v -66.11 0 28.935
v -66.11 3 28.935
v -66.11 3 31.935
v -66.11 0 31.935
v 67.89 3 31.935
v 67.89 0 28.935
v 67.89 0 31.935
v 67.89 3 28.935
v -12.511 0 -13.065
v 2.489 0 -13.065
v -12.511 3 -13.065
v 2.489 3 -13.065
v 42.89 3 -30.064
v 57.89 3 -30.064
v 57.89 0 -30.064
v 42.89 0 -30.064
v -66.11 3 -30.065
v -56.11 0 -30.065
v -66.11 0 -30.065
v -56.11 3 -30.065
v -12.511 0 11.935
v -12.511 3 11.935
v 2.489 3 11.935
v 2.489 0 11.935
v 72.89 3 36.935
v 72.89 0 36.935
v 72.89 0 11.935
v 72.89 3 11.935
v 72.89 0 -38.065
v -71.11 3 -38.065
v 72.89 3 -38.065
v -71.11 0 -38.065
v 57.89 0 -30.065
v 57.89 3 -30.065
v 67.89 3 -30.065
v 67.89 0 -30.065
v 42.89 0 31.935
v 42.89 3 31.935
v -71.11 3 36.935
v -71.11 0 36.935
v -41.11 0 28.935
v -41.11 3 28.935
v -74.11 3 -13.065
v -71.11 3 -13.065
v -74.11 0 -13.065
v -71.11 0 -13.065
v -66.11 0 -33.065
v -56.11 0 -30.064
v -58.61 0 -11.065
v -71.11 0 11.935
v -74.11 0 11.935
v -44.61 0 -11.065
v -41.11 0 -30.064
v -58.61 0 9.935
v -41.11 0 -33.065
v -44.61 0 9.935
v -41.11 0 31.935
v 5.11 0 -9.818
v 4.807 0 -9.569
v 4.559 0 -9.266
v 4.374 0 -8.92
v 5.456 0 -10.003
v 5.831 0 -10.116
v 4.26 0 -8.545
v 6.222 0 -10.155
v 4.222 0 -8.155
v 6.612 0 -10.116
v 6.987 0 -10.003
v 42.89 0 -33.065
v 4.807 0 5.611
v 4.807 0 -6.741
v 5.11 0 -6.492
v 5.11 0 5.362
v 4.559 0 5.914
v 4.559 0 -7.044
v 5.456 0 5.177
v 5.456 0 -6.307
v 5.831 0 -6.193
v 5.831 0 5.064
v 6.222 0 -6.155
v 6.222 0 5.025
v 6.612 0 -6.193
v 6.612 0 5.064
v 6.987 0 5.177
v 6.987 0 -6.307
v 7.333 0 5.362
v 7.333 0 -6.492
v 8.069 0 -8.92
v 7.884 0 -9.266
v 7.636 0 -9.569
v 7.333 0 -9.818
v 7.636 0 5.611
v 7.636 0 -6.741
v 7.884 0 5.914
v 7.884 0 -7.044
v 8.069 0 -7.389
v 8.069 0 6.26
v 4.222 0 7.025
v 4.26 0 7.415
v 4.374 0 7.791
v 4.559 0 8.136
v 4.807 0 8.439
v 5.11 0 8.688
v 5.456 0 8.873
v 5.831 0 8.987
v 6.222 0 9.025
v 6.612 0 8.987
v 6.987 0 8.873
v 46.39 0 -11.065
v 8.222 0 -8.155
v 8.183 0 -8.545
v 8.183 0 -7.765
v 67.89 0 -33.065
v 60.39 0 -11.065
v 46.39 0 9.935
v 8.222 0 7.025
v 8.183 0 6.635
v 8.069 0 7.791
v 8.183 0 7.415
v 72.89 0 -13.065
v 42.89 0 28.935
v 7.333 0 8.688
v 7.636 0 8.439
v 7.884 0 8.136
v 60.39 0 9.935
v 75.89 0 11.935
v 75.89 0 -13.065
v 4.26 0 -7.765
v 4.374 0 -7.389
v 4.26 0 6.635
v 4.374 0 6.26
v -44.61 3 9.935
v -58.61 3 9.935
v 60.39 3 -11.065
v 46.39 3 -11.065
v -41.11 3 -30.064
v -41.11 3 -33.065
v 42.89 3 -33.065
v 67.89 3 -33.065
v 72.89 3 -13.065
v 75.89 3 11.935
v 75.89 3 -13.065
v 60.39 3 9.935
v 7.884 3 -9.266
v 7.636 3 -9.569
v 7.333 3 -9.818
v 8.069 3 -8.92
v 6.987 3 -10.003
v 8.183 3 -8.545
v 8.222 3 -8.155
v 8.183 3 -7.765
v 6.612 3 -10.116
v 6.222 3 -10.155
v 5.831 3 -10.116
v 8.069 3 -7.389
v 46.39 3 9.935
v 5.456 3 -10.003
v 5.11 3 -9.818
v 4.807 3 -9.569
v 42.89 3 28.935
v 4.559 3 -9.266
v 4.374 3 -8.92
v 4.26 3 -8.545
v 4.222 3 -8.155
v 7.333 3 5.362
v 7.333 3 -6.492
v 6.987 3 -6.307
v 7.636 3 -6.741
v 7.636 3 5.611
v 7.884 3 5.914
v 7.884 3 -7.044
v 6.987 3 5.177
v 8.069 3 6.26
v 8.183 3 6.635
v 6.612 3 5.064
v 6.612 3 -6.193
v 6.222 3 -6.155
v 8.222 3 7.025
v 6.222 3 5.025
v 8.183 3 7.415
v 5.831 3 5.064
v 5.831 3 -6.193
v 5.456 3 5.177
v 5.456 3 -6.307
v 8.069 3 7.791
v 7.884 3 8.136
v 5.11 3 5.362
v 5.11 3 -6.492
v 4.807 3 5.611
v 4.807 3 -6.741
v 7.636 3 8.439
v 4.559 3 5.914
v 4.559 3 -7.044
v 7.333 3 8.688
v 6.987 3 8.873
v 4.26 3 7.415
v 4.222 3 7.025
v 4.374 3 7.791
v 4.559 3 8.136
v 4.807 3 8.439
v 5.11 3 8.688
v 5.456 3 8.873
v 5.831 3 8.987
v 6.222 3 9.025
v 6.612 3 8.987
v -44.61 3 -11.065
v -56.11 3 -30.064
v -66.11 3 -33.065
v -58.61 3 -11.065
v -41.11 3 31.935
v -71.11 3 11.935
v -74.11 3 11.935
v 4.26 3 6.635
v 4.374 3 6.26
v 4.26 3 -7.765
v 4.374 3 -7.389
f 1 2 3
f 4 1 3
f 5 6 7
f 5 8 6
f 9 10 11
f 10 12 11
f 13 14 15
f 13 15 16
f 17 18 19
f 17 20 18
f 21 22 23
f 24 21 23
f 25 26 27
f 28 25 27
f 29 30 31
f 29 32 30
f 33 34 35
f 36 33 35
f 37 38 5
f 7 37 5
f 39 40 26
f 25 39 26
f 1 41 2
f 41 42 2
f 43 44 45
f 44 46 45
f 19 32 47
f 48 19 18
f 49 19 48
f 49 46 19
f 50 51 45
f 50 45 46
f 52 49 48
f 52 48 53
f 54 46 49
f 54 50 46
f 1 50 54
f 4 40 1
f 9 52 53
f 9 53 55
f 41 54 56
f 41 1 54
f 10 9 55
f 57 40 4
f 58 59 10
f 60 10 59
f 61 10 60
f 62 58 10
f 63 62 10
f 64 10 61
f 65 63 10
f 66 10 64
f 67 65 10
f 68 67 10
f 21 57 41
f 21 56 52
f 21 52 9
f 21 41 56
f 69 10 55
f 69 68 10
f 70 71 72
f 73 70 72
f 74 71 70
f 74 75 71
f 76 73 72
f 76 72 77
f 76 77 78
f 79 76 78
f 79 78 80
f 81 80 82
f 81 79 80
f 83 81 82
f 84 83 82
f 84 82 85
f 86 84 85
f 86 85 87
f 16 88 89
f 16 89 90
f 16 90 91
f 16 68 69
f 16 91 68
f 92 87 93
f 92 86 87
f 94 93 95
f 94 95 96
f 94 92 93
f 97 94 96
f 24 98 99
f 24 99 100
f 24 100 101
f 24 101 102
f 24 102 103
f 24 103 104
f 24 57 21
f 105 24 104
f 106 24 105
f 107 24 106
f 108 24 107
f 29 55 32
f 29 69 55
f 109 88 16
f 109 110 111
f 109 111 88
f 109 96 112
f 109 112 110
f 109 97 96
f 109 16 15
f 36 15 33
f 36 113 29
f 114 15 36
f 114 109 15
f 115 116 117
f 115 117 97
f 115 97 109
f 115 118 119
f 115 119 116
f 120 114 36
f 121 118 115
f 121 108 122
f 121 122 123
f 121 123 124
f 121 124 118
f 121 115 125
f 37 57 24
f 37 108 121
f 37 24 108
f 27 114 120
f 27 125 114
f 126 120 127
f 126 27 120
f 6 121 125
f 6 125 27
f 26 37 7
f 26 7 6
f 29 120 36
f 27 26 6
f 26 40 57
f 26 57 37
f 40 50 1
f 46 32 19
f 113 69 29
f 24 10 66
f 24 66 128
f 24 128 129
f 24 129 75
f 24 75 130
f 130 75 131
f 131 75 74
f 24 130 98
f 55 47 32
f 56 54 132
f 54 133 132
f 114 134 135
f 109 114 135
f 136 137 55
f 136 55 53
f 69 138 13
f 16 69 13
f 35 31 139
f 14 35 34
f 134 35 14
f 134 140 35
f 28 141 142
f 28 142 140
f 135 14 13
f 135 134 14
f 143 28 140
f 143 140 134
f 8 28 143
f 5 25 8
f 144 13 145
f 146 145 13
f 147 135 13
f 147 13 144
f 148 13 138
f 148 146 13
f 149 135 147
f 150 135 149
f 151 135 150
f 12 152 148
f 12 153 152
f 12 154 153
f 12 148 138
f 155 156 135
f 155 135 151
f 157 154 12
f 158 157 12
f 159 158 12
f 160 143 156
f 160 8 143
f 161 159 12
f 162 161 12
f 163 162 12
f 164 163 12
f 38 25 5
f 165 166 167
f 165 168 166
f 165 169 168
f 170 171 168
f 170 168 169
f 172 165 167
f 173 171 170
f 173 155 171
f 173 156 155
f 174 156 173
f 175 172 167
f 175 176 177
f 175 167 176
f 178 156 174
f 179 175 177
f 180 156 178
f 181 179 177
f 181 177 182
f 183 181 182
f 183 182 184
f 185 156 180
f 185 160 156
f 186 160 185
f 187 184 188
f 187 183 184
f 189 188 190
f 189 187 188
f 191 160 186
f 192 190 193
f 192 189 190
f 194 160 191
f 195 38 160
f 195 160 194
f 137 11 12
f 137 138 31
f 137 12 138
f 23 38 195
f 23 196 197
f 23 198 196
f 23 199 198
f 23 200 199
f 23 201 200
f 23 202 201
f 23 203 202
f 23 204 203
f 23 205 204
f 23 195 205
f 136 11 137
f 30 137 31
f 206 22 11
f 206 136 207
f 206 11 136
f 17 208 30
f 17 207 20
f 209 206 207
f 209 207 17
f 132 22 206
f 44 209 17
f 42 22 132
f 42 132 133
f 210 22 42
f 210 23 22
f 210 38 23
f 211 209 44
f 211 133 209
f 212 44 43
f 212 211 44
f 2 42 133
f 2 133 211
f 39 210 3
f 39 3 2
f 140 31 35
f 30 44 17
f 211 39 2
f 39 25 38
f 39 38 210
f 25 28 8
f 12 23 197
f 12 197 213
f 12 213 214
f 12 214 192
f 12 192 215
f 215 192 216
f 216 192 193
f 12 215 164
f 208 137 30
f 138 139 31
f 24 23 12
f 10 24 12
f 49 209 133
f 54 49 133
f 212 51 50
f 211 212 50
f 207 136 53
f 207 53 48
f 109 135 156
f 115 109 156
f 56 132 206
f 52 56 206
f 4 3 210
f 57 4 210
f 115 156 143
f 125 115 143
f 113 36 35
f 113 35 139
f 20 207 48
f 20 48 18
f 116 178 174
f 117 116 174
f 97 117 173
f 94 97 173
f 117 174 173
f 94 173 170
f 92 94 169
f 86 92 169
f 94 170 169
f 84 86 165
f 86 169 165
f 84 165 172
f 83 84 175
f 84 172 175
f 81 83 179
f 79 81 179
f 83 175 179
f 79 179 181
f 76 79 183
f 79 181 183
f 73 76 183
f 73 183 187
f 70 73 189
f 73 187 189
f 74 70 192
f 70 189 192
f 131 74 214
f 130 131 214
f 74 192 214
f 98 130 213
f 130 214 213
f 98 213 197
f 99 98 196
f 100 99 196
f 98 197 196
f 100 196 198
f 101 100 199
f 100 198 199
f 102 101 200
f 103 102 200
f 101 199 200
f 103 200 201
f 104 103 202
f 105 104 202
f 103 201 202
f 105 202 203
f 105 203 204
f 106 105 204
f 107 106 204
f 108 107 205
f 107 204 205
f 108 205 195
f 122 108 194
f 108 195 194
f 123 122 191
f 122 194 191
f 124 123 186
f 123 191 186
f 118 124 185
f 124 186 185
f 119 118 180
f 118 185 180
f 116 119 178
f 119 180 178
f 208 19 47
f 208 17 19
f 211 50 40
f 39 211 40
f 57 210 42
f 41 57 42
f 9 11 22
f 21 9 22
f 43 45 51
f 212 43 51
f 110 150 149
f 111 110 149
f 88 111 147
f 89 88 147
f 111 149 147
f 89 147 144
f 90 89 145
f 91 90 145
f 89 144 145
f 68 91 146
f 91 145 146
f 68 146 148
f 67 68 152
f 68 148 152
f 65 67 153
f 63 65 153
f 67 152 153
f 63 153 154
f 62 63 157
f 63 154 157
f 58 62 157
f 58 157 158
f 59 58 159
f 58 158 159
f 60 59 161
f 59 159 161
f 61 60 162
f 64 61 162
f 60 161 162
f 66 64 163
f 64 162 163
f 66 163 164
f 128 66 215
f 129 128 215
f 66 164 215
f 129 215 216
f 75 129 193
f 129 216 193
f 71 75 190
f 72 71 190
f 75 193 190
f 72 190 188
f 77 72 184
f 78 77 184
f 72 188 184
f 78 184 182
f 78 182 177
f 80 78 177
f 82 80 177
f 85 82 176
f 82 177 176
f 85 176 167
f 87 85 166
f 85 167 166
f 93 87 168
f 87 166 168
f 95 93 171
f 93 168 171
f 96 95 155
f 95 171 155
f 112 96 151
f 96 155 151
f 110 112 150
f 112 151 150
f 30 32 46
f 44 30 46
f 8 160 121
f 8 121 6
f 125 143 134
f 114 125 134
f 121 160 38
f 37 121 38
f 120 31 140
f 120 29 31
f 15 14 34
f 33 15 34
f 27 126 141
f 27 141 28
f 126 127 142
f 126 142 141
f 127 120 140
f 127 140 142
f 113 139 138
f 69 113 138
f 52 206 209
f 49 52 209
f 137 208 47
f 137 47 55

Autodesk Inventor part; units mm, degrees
ref_plane "YZ Plane" through (0, 0, 0) normal (1, 0, 0) x (0, 1, 0)
ref_plane "XZ Plane" through (0, 0, 0) normal (0, 1, 0) x (-1, 0, 0)
ref_plane "XY Plane" through (0, 0, 0) normal (0, 0, 1) x (1, 0, 0)
sketch "Sketch1" plane through (0, 0, 0) normal (0, 1, 0) x (-1, 0, 0)
  line L0 (71.1097, -38.0648) -> (71.1097, -13.0648)
  line L1 (71.1097, -13.0648) -> (74.1097, -13.0648)
  line L2 (74.1097, -13.0648) -> (74.1097, 11.9352)
  line L3 (74.1097, 11.9352) -> (71.1097, 11.9352)
  line L4 (71.1097, 11.9352) -> (71.1097, 36.9352)
  line L5 (-72.8903, -38.0648) -> (-72.8903, -13.0648)
  line L6 (-72.8903, 36.9352) -> (-72.8903, 11.9352)
  line L7 (-72.8903, -13.0648) -> (-75.8903, -13.0648)
  line L8 (-75.8903, -13.0648) -> (-75.8903, 11.9352)
  line L9 (-75.8903, 11.9352) -> (-72.8903, 11.9352)
  line L10 (71.1097, -38.0648) -> (-72.8903, -38.0648)
  line L11 (71.1097, 36.9352) -> (-72.8903, 36.9352)
  point P0 (0, 0)
extrude "Extrusion1" add sketch "Sketch1" along normal blind 3
sketch "Sketch2" plane through (0, 3, 0) normal (0, 1, 0) x (1, 0, 0)
  line L0 (-71.1097, -36.9352) -> (72.8903, -36.9352) projected
  line L1 (-66.1097, -31.9352) -> (-56.1097, -31.9352)
  line L2 (-56.1097, -31.9352) -> (-56.1097, -28.9352)
  line L3 (-56.1097, -28.9352) -> (-66.1097, -28.9352)
  line L4 (-66.1097, -28.9352) -> (-66.1097, -31.9352)
  line L5 (72.8903, 38.0648) -> (-71.1097, 38.0648) projected
  line L6 (-56.1097, 30.0648) -> (-66.1097, 30.0648)
  line L7 (-66.1097, 30.0648) -> (-66.1097, 33.0648)
  line L8 (-66.1097, 33.0648) -> (-56.1097, 33.0648)
  line L9 (-56.1097, 33.0648) -> (-56.1097, 30.0648)
  line L10 (67.8903, 33.0648) -> (57.8903, 33.0648)
  line L11 (57.8903, 33.0648) -> (57.8903, 30.0648)
  line L12 (57.8903, 30.0648) -> (67.8903, 30.0648)
  line L13 (67.8903, 30.0648) -> (67.8903, 33.0648)
  line L14 (67.8903, -31.9352) -> (57.8903, -31.9352)
  line L15 (57.8903, -31.9352) -> (57.8903, -28.9352)
  line L16 (57.8903, -28.9352) -> (67.8903, -28.9352)
  line L17 (67.8903, -28.9352) -> (67.8903, -31.9352)
  point P0 (0, 0)
extrude "Extrusion2" cut sketch "Sketch2" against normal blind 30
sketch "Sketch3" plane through (0, 3, 0) normal (0, 1, 0) x (1, 0, 0)
  line L0 (72.8903, 38.0648) -> (-71.1097, 38.0648) projected
  line L1 (-71.1097, -36.9352) -> (72.8903, -36.9352) projected
  line L2 (-74.1097, 13.0648) -> (-74.1097, -11.9352) projected
  line L3 (75.8903, -11.9352) -> (75.8903, 13.0648) projected
  circle A0 centre (6.2215, -7.0252) radius 2
  circle A1 centre (6.2215, 8.1548) radius 2
  line L4 (2.4888, 13.0648) -> (-12.5112, 13.0648)
  line L5 (-12.5112, 13.0648) -> (-12.5112, -11.9352)
  line L6 (-12.5112, -11.9352) -> (2.4888, -11.9352)
  line L7 (2.4888, -11.9352) -> (2.4888, 13.0648)
  line L8 (-58.6097, -9.9352) -> (-44.6097, -9.9352)
  line L9 (-44.6097, -9.9352) -> (-44.6097, 11.0648)
  line L10 (-44.6097, 11.0648) -> (-58.6097, 11.0648)
  line L11 (-58.6097, 11.0648) -> (-58.6097, -9.9352)
  line L12 (60.3903, 11.0648) -> (46.3903, 11.0648)
  line L13 (46.3903, 11.0648) -> (46.3903, -9.9352)
  line L14 (46.3903, -9.9352) -> (60.3903, -9.9352)
  line L15 (60.3903, -9.9352) -> (60.3903, 11.0648)
  line L16 (-71.1097, -36.9352) -> (72.8903, -36.9352) projected
  point P0 (0, 0)
  dimension "d56" = 14
  dimension "d57" = 21
  dimension "d59" = 25
  dimension "d60" = 15
  dimension "d61" = 4
  dimension "d62" = 4
  dimension "d63" = 14
  dimension "d64" = 21
extrude "Extrusion3" cut sketch "Sketch3" against normal blind 10
sketch "Sketch4" plane through (0, 3, 0) normal (0, 1, 0) x (1, 0, 0)
  line L0 (-56.1097, 33.0648) -> (-41.1097, 33.0648)
  line L1 (-41.1097, 33.0648) -> (-41.1097, 29.924)
  line L2 (-41.1097, 29.924) -> (-56.1097, 29.924)
  line L3 (-56.1097, 29.924) -> (-56.1097, 33.0648)
  line L4 (57.8903, 30.0648) -> (57.8903, 33.0648) projected
  line L5 (57.8903, 33.0648) -> (42.8903, 33.0648)
  line L6 (42.8903, 33.0648) -> (42.8903, 29.924)
  line L7 (42.8903, 29.924) -> (57.8903, 29.924)
  line L8 (57.8903, 29.924) -> (57.8903, 33.0648)
  line L9 (-56.1097, -31.9352) -> (-41.1097, -31.9352)
  line L10 (-41.1097, -31.9352) -> (-41.1097, -28.9352)
  line L11 (-41.1097, -28.9352) -> (-56.1097, -28.9352)
  line L12 (-56.1097, -28.9352) -> (-56.1097, -31.9352)
  line L13 (57.8903, -31.9352) -> (57.8903, -28.9352) projected
  line L14 (57.8903, -28.9352) -> (42.8903, -28.9352)
  line L15 (42.8903, -28.9352) -> (42.8903, -31.9352)
  line L16 (42.8903, -31.9352) -> (57.8903, -31.9352)
  line L17 (57.8903, -31.9352) -> (57.8903, -28.9352)
  point P0 (0, 0)
  dimension "d67" = 15
  dimension "d68" = 15
extrude "Extrusion4" cut sketch "Sketch4" against normal blind 10
sketch "Sketch5" plane through (-41.1097, 3, -29.924) normal (0, 0, -1) x (-1, 0, 0)
  line L0 (15, -3) -> (0, -3) projected
  line L1 (0, 0) -> (15, 0) projected
  line L2 (15, -3) -> (0, -3)
  line L3 (0, -3) -> (0, 0)
  line L4 (0, 0) -> (15, 0)
  line L5 (15, 0) -> (15, -3)
  point P0 (-41.1097, -3)
extrude "Extrusion5" add sketch "Sketch5" along normal blind 0.14
sketch "Sketch6" plane through (57.8903, 3, -29.924) normal (0, 0, -1) x (-1, 0, 0)
  line L0 (0, 0) -> (15, 0)
  line L1 (15, 0) -> (15, -3)
  line L2 (15, -3) -> (0, -3)
  line L3 (0, -3) -> (0, 0)
  point P0 (57.8903, -3)
extrude "Extrusion6" add sketch "Sketch6" along normal blind 0.14
properties part number "Level4 (Sensor + Schakelaar)"
